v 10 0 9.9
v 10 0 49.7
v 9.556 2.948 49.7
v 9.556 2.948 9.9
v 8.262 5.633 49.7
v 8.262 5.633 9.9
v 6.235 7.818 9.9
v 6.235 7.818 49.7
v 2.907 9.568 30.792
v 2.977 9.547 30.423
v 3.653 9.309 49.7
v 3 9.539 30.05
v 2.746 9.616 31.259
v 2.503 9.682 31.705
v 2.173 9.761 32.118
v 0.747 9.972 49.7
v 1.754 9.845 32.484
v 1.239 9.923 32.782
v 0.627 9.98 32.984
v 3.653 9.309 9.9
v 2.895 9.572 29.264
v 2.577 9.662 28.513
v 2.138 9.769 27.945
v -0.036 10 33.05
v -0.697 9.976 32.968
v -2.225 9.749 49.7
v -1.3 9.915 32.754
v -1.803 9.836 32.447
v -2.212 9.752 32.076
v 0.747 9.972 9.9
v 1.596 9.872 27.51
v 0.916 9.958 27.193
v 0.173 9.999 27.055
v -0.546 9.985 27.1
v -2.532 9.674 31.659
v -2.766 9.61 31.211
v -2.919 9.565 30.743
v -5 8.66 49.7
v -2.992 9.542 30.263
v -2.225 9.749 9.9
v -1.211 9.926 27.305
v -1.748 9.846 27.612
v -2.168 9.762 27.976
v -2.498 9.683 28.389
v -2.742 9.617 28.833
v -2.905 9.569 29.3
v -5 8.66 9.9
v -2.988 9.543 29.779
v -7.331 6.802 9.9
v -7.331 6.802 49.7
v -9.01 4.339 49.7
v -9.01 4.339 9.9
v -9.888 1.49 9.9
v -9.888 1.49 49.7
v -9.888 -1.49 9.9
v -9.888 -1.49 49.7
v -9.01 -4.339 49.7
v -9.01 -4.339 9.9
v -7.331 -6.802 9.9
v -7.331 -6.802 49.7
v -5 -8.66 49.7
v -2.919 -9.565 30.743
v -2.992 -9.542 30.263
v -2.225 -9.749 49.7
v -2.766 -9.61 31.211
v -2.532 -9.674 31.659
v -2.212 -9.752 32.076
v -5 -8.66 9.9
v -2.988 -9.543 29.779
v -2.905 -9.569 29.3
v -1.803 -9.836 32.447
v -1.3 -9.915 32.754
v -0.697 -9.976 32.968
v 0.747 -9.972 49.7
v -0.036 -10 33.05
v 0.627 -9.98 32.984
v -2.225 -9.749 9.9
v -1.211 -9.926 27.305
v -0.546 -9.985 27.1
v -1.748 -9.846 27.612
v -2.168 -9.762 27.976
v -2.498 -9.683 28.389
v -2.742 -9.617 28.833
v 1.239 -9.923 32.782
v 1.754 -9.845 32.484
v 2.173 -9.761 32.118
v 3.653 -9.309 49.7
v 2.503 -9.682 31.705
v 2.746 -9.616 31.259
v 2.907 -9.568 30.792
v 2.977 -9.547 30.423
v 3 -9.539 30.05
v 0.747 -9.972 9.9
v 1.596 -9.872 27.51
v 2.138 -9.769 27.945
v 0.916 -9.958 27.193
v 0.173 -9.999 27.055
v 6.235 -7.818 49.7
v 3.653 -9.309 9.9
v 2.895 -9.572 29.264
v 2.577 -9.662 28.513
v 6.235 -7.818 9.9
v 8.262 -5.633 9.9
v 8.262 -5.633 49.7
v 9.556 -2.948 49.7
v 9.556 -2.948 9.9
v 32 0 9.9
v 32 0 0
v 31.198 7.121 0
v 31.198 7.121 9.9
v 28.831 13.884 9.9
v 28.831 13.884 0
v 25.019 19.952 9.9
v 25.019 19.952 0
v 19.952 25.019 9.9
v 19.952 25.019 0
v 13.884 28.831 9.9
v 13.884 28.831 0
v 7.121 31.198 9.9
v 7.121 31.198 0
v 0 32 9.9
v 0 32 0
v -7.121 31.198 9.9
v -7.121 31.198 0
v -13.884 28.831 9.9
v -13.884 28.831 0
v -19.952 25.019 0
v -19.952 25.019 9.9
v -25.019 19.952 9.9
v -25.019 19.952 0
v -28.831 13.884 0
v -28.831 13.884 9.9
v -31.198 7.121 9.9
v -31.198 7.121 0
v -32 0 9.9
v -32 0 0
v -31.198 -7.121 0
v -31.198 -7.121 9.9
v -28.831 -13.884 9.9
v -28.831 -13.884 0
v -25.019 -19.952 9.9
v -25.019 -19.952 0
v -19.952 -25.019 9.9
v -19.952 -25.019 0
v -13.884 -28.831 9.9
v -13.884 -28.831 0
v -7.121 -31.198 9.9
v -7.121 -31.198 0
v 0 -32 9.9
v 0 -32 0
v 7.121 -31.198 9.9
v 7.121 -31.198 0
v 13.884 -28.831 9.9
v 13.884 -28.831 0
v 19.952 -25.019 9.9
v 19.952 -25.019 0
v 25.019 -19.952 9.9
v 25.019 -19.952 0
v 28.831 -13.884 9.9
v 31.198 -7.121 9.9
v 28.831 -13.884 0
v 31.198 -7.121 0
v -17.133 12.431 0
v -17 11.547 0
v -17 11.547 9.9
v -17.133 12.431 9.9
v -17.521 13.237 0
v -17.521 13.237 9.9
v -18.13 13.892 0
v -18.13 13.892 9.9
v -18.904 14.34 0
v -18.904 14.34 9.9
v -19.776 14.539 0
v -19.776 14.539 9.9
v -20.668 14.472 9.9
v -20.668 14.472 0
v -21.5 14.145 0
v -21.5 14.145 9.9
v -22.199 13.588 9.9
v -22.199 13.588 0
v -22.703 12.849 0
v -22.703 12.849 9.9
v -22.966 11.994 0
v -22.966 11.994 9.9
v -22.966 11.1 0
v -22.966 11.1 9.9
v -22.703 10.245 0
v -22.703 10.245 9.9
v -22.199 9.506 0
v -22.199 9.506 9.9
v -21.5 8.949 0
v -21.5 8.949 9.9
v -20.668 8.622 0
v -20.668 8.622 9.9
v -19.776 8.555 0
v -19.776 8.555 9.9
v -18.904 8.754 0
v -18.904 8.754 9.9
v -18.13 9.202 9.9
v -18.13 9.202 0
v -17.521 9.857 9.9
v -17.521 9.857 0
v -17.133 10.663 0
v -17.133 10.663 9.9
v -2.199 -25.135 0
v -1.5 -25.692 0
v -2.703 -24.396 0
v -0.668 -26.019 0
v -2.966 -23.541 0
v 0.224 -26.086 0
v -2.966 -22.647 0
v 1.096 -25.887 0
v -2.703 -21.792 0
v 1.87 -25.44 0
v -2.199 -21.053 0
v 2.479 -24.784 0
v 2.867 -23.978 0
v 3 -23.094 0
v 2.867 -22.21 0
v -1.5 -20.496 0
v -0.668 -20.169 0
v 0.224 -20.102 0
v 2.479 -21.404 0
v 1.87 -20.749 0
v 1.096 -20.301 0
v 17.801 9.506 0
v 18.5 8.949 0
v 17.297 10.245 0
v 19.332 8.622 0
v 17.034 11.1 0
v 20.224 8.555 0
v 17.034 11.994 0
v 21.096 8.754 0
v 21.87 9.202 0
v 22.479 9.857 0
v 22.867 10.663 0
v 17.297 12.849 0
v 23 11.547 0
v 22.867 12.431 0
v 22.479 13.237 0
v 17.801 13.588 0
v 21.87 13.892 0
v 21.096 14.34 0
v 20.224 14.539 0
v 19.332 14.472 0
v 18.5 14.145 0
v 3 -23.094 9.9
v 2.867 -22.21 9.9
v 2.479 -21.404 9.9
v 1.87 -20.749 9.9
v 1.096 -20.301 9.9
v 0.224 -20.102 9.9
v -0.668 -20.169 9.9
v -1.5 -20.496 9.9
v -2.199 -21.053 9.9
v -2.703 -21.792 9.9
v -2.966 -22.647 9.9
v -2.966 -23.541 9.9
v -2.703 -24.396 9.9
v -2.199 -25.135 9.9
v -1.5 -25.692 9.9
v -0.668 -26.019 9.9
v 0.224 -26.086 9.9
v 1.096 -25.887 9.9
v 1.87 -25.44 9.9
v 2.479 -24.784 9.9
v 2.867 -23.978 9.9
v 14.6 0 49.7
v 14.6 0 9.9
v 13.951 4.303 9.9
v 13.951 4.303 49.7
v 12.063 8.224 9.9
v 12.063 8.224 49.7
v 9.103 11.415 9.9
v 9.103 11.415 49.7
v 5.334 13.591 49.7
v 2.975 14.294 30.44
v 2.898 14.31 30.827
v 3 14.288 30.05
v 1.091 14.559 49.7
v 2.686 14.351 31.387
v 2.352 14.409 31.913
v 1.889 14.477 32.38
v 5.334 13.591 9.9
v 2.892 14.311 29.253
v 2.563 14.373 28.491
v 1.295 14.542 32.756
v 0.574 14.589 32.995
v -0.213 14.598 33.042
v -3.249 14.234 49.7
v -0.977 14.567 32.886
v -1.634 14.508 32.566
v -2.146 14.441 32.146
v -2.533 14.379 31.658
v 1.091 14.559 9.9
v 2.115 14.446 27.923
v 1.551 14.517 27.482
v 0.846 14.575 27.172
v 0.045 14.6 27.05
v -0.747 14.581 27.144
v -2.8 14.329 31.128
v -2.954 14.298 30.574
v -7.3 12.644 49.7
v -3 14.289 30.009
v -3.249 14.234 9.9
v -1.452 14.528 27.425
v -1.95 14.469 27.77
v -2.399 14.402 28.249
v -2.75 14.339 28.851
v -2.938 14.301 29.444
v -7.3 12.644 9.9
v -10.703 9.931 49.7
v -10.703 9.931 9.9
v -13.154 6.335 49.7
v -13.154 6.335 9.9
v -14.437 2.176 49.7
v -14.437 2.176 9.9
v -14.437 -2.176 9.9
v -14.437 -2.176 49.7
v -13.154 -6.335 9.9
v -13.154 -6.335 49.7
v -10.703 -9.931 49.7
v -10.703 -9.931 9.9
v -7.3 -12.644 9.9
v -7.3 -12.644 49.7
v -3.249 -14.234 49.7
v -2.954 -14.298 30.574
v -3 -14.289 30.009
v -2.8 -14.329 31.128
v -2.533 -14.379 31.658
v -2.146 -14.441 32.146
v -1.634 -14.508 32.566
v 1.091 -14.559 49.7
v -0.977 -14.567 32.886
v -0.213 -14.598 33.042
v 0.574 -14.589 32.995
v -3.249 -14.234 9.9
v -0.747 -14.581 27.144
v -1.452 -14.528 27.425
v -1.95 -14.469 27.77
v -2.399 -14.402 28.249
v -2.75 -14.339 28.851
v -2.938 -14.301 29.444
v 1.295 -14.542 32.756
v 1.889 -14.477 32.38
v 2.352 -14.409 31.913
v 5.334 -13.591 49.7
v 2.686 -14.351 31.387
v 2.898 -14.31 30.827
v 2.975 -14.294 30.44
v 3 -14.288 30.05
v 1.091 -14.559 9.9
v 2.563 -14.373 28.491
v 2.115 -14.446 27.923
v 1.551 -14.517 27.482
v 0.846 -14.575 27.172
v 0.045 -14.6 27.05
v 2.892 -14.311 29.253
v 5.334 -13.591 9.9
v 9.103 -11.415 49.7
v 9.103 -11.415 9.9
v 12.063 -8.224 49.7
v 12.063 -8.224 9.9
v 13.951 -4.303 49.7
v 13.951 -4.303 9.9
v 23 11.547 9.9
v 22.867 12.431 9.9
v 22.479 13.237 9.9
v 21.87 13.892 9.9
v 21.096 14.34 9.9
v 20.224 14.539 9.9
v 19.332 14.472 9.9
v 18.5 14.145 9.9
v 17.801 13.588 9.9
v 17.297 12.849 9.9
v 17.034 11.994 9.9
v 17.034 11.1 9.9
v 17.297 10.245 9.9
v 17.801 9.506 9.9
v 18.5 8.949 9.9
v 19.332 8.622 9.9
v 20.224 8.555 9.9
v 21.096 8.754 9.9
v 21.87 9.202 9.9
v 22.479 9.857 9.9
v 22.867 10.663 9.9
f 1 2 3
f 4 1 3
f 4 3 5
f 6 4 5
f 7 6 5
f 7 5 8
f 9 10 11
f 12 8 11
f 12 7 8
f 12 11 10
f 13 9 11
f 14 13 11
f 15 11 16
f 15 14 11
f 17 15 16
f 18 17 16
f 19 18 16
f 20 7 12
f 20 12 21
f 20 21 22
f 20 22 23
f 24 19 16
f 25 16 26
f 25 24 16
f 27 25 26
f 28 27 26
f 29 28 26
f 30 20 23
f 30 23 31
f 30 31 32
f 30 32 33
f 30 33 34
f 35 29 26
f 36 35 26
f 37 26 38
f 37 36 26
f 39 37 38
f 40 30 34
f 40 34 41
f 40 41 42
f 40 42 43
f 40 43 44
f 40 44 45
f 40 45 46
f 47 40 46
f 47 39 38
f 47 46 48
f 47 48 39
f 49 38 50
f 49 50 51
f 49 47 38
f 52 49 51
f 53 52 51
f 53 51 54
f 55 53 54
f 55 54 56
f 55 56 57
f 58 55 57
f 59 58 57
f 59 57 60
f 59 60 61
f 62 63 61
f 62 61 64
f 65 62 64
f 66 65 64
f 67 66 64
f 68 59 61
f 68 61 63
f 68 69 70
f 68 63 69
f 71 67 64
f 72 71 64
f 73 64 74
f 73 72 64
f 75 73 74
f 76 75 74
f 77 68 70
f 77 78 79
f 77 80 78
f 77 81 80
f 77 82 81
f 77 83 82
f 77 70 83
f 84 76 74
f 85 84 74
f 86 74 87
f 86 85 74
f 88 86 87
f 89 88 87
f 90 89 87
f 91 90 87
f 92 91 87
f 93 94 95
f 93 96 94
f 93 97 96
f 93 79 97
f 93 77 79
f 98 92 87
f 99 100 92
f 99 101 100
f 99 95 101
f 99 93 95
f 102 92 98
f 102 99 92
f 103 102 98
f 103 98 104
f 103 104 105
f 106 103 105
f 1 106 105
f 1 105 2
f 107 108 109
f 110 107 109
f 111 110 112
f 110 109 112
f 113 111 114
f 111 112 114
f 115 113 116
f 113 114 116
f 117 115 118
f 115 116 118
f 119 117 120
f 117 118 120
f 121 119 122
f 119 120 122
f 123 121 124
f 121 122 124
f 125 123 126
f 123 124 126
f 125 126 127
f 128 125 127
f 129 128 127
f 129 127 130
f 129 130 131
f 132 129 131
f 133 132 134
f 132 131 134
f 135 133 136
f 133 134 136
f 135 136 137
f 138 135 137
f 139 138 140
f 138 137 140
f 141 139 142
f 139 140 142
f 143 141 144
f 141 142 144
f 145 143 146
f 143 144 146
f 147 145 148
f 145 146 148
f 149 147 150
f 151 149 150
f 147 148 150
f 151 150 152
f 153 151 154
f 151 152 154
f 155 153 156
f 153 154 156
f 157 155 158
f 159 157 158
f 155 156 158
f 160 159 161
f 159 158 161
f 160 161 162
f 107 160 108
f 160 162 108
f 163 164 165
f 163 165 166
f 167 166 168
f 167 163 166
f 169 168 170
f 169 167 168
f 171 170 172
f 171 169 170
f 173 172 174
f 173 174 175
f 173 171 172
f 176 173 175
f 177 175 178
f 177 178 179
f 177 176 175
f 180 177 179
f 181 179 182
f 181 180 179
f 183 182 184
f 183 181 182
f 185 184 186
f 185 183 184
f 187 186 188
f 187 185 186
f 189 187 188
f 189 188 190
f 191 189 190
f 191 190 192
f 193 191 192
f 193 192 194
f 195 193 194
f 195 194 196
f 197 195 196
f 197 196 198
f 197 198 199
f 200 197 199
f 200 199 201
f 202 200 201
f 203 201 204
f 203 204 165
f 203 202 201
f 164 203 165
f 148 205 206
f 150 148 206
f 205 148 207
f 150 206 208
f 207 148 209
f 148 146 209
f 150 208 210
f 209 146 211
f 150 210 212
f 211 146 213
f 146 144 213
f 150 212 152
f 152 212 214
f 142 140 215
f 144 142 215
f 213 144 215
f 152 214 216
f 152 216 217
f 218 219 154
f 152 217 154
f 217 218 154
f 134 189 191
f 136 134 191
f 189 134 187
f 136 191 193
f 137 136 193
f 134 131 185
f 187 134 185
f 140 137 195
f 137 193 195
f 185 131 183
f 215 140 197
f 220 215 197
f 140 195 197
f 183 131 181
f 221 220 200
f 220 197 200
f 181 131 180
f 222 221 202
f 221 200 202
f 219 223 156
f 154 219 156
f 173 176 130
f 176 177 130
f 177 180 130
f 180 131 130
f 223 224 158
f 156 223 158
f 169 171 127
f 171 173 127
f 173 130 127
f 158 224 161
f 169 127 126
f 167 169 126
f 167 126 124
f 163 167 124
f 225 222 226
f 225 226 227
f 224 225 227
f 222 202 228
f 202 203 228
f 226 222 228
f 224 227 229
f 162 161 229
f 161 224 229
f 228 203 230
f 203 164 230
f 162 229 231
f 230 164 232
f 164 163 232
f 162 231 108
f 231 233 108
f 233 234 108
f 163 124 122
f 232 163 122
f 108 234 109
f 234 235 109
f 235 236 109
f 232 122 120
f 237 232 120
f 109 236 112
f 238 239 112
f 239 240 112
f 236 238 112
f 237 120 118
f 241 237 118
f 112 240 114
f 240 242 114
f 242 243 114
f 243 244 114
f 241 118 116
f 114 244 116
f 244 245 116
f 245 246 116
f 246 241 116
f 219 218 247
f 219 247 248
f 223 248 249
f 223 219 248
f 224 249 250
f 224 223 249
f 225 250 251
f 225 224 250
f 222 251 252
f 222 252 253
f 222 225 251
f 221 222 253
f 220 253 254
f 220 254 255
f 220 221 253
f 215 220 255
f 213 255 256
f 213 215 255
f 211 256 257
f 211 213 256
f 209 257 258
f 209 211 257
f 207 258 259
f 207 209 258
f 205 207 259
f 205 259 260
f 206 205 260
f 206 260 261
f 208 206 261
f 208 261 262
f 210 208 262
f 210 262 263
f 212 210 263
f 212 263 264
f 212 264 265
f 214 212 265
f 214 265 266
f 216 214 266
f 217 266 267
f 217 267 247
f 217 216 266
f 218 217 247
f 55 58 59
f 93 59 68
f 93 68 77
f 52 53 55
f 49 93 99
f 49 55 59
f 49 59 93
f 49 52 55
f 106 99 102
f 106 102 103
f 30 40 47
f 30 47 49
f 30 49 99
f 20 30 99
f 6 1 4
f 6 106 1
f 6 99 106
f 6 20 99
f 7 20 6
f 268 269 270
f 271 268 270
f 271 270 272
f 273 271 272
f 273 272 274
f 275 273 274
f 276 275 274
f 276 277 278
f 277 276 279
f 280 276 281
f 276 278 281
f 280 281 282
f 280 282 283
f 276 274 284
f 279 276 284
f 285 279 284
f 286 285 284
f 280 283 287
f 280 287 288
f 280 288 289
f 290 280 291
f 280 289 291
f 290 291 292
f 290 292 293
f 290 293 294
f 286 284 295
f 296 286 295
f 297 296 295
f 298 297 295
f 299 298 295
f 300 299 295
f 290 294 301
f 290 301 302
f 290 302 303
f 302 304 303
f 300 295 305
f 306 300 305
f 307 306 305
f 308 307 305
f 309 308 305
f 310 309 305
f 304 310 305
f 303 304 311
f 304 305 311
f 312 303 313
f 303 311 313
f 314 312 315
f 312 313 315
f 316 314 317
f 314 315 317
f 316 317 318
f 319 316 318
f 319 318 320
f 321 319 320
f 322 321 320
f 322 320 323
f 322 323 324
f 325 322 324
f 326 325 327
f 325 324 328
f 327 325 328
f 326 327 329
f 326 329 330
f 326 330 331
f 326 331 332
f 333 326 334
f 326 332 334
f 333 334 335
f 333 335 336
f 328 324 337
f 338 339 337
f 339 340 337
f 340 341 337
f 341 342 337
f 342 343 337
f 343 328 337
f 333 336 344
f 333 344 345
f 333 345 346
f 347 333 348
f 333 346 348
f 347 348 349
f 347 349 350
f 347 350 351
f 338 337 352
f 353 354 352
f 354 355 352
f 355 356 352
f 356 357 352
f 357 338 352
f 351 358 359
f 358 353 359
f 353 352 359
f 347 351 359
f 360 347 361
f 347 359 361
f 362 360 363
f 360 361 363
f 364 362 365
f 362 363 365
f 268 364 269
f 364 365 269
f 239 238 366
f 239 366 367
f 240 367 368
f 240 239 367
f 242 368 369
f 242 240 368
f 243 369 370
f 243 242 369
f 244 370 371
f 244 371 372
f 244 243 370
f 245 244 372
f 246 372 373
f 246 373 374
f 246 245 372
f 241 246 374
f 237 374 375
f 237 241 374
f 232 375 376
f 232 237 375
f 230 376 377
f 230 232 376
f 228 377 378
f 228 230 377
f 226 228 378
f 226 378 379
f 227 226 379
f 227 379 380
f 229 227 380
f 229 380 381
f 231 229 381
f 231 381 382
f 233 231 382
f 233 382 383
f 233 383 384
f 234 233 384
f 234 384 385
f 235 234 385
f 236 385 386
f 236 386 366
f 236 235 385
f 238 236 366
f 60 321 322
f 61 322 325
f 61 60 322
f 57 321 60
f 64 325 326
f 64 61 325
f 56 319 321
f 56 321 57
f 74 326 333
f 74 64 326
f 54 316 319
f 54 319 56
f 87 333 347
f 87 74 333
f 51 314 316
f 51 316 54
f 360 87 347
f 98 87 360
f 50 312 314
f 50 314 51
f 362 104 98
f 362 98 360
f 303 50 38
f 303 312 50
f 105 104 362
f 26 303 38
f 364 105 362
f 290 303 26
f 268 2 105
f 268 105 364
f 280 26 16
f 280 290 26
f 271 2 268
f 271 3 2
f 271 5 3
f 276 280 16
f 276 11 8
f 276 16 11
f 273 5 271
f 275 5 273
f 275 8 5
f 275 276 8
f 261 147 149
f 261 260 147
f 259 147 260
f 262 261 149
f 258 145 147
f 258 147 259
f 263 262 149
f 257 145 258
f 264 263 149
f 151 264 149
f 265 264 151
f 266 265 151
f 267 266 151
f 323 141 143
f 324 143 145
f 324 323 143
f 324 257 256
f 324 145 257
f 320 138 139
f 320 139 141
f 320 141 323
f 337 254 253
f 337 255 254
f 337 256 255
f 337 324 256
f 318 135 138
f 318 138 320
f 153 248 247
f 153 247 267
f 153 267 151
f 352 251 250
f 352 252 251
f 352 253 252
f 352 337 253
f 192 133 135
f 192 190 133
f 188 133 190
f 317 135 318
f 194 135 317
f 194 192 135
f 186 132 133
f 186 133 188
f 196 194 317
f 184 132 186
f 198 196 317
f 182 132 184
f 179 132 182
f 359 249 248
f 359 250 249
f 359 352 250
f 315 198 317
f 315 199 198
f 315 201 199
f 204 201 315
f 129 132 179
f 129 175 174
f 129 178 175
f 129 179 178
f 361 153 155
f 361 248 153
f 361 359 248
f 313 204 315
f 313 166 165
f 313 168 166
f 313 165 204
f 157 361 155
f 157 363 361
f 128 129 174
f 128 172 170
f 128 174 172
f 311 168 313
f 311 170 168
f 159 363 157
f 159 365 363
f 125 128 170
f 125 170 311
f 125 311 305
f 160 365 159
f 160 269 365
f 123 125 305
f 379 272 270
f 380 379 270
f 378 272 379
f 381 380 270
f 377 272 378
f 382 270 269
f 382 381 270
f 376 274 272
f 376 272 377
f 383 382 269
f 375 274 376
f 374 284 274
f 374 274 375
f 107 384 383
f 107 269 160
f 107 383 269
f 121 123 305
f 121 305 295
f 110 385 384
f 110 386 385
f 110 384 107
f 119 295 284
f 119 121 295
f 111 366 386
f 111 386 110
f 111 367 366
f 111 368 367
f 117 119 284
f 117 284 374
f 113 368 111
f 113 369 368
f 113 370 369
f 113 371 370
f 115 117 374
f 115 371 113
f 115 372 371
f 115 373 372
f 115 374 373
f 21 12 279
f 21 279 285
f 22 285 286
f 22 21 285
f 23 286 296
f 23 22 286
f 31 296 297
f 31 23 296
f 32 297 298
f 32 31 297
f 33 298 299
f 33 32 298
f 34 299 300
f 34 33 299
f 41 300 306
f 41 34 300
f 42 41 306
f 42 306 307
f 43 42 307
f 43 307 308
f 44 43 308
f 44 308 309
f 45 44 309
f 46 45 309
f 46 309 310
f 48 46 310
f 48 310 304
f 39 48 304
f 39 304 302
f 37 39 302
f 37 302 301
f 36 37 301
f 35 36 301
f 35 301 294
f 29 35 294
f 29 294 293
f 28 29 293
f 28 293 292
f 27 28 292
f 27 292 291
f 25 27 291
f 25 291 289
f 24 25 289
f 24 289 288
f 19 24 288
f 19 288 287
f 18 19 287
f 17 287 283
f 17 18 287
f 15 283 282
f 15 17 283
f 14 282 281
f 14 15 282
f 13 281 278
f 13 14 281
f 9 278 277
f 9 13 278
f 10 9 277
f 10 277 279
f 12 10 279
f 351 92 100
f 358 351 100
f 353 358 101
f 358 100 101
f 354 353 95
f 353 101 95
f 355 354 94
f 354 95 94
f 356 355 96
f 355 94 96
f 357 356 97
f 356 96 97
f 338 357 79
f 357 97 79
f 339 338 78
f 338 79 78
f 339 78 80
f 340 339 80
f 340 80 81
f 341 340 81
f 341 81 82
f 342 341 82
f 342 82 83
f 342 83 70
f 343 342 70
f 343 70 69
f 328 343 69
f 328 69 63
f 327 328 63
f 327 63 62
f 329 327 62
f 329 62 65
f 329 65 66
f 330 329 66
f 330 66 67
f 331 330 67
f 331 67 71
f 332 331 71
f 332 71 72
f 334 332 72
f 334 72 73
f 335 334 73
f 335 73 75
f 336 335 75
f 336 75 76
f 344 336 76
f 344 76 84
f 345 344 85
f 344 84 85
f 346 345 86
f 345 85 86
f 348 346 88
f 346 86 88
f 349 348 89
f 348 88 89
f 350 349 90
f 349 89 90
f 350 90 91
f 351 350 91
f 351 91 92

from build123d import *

# Parameters (mm, degrees)
SKETCH1_R               = 32
SKETCH1_R_2             = 3
BOSS_EXTRUDE1_DEPTH     = 9.9
SKETCH2_R               = 14.6
SKETCH2_R_2             = 10
BOSS_EXTRUDE2_DEPTH     = 39.8
SKETCH3_R               = 3
CUT_EXTRUDE1_DEPTH      = 33
CUT_EXTRUDE1_DEPTH_BACK = 33


with BuildPart() as part:
    # Sketch1 → Boss-Extrude1 (new body)
    with BuildSketch(Plane.XY):
        Circle(SKETCH1_R)
        with Locations((20, 11.547005384)):
            Circle(SKETCH1_R_2, mode=Mode.SUBTRACT)
        with Locations((0, -23.094010768)):
            Circle(SKETCH1_R_2, mode=Mode.SUBTRACT)
        with Locations((-20, 11.547005384)):
            Circle(SKETCH1_R_2, mode=Mode.SUBTRACT)
    extrude(amount=BOSS_EXTRUDE1_DEPTH)

    # Sketch2 → Boss-Extrude2 (add)
    with BuildSketch(Plane.XY.offset(9.9)):
        Circle(SKETCH2_R)
        Circle(SKETCH2_R_2, mode=Mode.SUBTRACT)
    extrude(amount=BOSS_EXTRUDE2_DEPTH)

    # Sketch3 → Cut-Extrude1 (cut, two sides)
    with BuildSketch(Plane(origin=(0, 0, 0), x_dir=(1, 0, 0), z_dir=(0, 1, 0))) as cut_extrude1_sk:
        with Locations((0, -30.05)):
            Circle(SKETCH3_R)
    extrude(amount=CUT_EXTRUDE1_DEPTH, mode=Mode.SUBTRACT)
    extrude(cut_extrude1_sk.sketch, amount=-CUT_EXTRUDE1_DEPTH_BACK, mode=Mode.SUBTRACT)


solid = part.part
